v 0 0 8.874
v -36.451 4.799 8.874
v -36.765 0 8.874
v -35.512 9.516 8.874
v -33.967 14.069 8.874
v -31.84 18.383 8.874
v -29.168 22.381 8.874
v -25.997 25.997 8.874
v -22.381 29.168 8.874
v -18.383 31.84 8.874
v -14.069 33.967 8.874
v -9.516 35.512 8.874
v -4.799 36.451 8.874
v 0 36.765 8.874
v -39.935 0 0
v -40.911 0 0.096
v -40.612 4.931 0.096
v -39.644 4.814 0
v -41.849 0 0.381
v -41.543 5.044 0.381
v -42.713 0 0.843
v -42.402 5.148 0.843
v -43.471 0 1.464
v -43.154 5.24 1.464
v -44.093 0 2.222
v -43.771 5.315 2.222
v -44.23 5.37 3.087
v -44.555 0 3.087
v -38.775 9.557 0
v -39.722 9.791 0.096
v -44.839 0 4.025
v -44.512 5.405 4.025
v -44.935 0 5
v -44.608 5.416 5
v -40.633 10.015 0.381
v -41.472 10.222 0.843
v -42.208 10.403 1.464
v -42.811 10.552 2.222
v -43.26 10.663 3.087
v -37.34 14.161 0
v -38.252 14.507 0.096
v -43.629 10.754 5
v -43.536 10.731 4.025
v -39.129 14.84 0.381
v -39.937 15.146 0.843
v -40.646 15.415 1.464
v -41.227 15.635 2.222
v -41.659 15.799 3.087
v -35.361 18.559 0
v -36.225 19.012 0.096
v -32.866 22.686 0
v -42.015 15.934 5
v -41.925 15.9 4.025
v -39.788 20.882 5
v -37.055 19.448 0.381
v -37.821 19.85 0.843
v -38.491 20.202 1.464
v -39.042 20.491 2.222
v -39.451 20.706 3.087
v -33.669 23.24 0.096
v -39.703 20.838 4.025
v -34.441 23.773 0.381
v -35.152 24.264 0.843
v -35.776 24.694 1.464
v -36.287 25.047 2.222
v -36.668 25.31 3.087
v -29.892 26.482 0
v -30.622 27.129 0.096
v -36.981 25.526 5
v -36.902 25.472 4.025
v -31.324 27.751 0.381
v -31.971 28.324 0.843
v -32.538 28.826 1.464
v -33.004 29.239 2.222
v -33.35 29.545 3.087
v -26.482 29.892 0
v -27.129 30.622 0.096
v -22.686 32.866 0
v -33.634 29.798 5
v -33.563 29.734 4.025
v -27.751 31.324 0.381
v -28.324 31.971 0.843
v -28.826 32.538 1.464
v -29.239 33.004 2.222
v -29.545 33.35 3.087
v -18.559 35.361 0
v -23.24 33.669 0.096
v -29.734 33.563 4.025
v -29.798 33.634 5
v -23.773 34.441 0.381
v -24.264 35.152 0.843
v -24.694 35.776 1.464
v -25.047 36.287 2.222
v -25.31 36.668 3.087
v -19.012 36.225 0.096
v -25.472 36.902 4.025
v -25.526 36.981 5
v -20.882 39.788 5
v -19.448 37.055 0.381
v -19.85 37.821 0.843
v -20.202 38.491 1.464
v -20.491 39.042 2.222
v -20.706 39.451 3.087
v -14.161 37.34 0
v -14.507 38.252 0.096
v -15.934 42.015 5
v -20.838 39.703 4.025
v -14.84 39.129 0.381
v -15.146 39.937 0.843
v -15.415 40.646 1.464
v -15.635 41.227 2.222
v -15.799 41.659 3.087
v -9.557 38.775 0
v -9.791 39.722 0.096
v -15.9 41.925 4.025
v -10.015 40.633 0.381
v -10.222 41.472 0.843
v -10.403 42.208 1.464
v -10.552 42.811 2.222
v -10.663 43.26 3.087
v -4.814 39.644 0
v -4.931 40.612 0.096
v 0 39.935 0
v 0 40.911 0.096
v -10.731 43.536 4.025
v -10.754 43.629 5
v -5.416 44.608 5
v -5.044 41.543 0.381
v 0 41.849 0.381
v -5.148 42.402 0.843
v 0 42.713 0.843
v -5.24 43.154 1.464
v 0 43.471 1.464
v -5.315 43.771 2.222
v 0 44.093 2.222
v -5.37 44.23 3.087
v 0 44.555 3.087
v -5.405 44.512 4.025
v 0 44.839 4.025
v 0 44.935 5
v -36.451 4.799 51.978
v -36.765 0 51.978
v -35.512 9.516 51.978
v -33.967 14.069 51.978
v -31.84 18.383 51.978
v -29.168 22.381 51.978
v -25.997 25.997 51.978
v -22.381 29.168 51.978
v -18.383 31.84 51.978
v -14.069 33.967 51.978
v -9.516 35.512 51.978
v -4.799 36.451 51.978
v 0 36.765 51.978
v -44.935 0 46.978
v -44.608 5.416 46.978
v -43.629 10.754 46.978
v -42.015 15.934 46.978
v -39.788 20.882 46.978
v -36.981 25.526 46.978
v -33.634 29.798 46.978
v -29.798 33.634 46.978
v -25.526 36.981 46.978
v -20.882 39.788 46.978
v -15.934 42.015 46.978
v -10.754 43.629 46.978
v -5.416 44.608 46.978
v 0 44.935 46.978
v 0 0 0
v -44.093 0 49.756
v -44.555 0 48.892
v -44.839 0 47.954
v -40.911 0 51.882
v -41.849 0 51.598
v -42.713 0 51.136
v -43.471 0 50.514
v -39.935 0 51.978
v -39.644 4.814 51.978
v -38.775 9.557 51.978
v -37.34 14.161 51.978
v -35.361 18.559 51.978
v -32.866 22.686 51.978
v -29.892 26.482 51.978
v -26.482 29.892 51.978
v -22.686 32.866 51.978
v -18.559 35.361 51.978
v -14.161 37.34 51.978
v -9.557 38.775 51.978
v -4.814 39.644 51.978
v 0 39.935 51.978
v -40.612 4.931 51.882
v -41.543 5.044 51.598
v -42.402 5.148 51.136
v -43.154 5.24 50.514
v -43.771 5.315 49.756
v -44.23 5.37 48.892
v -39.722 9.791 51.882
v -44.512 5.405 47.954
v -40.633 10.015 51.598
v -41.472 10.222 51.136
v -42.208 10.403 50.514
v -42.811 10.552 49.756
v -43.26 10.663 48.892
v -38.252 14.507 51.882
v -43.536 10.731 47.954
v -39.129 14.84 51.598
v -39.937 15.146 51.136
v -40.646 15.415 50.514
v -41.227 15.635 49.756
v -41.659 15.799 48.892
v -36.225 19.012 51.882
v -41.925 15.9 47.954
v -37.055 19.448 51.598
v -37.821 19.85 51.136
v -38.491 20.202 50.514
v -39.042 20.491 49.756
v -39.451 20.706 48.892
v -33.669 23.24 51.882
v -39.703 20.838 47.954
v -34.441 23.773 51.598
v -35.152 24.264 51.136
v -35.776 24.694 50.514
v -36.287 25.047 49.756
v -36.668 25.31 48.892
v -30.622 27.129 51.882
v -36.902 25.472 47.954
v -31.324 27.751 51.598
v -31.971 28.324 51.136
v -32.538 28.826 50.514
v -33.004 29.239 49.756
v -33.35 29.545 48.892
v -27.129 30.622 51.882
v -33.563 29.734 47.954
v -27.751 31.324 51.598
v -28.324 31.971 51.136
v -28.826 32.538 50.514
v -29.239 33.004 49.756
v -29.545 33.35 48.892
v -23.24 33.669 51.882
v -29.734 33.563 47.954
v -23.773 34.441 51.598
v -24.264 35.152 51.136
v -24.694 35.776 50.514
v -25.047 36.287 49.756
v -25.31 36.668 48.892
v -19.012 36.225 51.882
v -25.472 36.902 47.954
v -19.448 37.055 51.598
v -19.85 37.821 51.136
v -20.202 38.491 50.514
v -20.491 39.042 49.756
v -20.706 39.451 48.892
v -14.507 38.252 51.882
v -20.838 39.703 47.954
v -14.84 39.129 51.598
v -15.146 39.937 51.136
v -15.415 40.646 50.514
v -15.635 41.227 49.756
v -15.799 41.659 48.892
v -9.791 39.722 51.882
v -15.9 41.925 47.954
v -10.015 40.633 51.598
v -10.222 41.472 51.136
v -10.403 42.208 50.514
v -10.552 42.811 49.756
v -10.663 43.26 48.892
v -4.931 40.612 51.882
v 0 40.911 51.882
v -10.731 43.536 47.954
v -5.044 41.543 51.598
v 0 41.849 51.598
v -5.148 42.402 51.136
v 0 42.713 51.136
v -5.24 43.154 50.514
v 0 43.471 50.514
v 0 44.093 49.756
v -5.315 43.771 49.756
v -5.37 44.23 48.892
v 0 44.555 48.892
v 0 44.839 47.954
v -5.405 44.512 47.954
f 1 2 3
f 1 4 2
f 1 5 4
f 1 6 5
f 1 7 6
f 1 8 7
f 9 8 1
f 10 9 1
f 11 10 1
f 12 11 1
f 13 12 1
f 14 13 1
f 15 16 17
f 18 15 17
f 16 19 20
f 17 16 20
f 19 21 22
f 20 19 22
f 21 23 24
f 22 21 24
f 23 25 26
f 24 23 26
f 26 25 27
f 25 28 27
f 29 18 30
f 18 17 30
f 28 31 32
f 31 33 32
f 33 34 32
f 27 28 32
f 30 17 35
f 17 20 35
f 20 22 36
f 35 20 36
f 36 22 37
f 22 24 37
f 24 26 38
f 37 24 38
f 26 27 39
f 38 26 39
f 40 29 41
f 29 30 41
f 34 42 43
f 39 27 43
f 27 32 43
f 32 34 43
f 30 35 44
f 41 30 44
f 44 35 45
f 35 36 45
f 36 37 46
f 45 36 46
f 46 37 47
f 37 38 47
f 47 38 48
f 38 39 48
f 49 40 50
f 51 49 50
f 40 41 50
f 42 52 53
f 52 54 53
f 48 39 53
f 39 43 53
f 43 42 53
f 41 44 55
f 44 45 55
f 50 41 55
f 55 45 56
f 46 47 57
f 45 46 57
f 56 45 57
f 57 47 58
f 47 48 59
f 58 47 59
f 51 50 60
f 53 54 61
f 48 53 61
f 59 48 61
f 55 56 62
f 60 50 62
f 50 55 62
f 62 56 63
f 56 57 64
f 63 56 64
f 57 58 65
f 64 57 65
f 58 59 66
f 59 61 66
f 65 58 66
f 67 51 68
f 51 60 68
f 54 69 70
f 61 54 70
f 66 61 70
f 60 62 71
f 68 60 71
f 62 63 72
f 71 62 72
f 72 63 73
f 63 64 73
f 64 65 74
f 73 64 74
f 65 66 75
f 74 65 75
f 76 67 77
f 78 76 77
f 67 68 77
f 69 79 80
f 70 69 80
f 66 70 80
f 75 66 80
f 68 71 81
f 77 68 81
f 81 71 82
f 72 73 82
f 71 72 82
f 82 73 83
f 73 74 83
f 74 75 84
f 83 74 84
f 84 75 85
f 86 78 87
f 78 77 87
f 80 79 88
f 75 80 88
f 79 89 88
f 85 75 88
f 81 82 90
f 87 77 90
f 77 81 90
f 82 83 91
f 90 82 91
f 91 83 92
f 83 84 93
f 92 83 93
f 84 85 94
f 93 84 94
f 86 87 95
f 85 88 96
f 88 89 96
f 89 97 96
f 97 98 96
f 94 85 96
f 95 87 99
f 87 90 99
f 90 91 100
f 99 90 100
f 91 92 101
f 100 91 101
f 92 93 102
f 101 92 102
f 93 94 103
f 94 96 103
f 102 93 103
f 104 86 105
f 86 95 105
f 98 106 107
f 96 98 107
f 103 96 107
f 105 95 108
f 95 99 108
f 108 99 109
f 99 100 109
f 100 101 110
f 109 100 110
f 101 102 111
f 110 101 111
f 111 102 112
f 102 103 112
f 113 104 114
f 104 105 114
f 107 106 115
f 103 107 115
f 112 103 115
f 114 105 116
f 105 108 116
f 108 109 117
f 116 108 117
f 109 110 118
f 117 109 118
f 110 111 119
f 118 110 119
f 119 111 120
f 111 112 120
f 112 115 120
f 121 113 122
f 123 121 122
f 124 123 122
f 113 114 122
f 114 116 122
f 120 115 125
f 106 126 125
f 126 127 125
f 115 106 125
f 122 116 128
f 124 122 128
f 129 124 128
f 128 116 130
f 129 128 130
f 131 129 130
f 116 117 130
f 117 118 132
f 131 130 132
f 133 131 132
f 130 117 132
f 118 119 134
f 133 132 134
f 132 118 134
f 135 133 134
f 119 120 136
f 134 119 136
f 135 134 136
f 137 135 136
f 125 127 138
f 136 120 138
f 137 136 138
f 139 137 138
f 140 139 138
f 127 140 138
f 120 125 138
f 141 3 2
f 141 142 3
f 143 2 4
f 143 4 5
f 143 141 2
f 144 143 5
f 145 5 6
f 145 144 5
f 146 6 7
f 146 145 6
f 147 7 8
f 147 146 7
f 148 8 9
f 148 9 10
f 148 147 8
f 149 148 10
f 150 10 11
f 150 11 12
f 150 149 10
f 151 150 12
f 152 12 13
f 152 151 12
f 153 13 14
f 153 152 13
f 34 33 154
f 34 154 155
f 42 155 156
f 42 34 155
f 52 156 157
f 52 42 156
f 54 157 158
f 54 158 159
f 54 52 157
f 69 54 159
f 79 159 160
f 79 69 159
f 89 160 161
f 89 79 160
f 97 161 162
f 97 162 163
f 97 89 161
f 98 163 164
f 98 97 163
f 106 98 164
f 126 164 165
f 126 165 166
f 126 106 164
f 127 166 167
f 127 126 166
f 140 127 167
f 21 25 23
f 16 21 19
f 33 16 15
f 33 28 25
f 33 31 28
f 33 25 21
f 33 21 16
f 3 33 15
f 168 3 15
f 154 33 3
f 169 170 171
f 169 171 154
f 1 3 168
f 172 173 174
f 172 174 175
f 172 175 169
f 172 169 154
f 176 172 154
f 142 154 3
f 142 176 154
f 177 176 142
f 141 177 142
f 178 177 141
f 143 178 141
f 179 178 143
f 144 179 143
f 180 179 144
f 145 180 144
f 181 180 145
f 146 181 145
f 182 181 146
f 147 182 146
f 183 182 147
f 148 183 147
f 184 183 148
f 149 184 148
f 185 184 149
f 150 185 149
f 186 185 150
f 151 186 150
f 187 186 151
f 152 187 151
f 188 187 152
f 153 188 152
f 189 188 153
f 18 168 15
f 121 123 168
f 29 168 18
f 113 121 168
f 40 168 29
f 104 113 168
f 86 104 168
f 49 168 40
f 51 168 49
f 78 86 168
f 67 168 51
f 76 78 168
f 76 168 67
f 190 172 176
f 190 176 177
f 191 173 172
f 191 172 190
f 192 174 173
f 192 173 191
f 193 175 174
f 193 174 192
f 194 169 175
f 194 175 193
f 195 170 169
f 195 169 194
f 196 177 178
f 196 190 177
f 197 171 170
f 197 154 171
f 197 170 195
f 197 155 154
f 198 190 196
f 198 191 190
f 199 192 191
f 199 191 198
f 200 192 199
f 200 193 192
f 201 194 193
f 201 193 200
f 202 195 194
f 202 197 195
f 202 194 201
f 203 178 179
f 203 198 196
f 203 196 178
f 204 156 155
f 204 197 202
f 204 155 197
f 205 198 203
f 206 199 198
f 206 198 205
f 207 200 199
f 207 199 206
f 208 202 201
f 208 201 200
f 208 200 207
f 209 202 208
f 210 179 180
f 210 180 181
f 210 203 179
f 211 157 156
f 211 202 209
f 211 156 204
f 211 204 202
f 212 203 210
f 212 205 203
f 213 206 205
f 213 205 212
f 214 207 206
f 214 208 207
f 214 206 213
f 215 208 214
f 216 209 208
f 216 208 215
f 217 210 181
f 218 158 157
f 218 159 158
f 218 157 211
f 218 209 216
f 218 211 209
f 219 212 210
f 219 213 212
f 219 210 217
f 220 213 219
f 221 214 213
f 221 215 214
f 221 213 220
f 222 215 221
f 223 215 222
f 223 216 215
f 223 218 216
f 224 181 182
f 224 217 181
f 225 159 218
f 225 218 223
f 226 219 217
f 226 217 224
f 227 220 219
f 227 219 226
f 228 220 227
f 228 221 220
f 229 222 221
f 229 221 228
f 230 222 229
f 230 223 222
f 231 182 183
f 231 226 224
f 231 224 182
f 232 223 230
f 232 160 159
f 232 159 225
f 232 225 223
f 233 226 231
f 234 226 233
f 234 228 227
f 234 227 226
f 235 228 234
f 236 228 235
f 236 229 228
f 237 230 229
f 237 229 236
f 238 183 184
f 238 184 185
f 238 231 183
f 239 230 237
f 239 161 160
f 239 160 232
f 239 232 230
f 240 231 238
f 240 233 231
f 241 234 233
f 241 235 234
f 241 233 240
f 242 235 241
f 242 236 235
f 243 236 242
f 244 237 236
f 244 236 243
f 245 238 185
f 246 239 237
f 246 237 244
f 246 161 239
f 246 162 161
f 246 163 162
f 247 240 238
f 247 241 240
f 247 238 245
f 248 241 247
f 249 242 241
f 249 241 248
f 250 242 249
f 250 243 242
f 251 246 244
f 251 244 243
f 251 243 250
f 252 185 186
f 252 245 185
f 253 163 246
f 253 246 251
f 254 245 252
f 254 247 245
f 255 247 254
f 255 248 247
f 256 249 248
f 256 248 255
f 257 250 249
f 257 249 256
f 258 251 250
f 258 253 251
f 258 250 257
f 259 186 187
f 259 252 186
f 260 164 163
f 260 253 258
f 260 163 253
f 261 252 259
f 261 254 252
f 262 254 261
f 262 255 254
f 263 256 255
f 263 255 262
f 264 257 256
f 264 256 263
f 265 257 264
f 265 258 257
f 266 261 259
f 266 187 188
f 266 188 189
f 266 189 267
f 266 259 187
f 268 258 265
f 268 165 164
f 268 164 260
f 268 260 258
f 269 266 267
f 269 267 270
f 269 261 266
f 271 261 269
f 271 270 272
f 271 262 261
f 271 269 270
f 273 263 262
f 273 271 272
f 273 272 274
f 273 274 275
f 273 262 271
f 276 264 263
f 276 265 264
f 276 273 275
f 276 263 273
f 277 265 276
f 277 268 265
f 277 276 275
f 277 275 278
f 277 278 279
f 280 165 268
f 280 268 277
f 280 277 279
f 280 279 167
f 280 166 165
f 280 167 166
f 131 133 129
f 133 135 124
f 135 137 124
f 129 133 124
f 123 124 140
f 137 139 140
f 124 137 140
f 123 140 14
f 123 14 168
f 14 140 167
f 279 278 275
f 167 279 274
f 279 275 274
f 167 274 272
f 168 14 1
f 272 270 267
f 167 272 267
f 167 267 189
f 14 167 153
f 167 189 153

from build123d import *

# Parameters (mm, degrees)
F1_ANGLE = 90
F2_R     = 5


with BuildPart() as f1:
    # F0 (on Front) → F1 (revolve)
    with BuildSketch(Plane.XZ):
        Polygon((-44.935193, 0), (0, 0), (0, 8.874348), (-36.765158, 8.874348), (-36.765158, 51.978327), (-44.935193, 51.978327), align=None)
    revolve(axis=Axis((0, 0, 4.437174), (0, 0, -1)), revolution_arc=F1_ANGLE)

    # F2
    f2_edges = [f1.edges().sort_by_distance(p)[0] for p in [
        (-31.77398, 31.77398, 51.978327),
        (-31.77398, 31.77398, 0),
    ]]
    fillet(f2_edges, radius=F2_R)


solid = f1.part
